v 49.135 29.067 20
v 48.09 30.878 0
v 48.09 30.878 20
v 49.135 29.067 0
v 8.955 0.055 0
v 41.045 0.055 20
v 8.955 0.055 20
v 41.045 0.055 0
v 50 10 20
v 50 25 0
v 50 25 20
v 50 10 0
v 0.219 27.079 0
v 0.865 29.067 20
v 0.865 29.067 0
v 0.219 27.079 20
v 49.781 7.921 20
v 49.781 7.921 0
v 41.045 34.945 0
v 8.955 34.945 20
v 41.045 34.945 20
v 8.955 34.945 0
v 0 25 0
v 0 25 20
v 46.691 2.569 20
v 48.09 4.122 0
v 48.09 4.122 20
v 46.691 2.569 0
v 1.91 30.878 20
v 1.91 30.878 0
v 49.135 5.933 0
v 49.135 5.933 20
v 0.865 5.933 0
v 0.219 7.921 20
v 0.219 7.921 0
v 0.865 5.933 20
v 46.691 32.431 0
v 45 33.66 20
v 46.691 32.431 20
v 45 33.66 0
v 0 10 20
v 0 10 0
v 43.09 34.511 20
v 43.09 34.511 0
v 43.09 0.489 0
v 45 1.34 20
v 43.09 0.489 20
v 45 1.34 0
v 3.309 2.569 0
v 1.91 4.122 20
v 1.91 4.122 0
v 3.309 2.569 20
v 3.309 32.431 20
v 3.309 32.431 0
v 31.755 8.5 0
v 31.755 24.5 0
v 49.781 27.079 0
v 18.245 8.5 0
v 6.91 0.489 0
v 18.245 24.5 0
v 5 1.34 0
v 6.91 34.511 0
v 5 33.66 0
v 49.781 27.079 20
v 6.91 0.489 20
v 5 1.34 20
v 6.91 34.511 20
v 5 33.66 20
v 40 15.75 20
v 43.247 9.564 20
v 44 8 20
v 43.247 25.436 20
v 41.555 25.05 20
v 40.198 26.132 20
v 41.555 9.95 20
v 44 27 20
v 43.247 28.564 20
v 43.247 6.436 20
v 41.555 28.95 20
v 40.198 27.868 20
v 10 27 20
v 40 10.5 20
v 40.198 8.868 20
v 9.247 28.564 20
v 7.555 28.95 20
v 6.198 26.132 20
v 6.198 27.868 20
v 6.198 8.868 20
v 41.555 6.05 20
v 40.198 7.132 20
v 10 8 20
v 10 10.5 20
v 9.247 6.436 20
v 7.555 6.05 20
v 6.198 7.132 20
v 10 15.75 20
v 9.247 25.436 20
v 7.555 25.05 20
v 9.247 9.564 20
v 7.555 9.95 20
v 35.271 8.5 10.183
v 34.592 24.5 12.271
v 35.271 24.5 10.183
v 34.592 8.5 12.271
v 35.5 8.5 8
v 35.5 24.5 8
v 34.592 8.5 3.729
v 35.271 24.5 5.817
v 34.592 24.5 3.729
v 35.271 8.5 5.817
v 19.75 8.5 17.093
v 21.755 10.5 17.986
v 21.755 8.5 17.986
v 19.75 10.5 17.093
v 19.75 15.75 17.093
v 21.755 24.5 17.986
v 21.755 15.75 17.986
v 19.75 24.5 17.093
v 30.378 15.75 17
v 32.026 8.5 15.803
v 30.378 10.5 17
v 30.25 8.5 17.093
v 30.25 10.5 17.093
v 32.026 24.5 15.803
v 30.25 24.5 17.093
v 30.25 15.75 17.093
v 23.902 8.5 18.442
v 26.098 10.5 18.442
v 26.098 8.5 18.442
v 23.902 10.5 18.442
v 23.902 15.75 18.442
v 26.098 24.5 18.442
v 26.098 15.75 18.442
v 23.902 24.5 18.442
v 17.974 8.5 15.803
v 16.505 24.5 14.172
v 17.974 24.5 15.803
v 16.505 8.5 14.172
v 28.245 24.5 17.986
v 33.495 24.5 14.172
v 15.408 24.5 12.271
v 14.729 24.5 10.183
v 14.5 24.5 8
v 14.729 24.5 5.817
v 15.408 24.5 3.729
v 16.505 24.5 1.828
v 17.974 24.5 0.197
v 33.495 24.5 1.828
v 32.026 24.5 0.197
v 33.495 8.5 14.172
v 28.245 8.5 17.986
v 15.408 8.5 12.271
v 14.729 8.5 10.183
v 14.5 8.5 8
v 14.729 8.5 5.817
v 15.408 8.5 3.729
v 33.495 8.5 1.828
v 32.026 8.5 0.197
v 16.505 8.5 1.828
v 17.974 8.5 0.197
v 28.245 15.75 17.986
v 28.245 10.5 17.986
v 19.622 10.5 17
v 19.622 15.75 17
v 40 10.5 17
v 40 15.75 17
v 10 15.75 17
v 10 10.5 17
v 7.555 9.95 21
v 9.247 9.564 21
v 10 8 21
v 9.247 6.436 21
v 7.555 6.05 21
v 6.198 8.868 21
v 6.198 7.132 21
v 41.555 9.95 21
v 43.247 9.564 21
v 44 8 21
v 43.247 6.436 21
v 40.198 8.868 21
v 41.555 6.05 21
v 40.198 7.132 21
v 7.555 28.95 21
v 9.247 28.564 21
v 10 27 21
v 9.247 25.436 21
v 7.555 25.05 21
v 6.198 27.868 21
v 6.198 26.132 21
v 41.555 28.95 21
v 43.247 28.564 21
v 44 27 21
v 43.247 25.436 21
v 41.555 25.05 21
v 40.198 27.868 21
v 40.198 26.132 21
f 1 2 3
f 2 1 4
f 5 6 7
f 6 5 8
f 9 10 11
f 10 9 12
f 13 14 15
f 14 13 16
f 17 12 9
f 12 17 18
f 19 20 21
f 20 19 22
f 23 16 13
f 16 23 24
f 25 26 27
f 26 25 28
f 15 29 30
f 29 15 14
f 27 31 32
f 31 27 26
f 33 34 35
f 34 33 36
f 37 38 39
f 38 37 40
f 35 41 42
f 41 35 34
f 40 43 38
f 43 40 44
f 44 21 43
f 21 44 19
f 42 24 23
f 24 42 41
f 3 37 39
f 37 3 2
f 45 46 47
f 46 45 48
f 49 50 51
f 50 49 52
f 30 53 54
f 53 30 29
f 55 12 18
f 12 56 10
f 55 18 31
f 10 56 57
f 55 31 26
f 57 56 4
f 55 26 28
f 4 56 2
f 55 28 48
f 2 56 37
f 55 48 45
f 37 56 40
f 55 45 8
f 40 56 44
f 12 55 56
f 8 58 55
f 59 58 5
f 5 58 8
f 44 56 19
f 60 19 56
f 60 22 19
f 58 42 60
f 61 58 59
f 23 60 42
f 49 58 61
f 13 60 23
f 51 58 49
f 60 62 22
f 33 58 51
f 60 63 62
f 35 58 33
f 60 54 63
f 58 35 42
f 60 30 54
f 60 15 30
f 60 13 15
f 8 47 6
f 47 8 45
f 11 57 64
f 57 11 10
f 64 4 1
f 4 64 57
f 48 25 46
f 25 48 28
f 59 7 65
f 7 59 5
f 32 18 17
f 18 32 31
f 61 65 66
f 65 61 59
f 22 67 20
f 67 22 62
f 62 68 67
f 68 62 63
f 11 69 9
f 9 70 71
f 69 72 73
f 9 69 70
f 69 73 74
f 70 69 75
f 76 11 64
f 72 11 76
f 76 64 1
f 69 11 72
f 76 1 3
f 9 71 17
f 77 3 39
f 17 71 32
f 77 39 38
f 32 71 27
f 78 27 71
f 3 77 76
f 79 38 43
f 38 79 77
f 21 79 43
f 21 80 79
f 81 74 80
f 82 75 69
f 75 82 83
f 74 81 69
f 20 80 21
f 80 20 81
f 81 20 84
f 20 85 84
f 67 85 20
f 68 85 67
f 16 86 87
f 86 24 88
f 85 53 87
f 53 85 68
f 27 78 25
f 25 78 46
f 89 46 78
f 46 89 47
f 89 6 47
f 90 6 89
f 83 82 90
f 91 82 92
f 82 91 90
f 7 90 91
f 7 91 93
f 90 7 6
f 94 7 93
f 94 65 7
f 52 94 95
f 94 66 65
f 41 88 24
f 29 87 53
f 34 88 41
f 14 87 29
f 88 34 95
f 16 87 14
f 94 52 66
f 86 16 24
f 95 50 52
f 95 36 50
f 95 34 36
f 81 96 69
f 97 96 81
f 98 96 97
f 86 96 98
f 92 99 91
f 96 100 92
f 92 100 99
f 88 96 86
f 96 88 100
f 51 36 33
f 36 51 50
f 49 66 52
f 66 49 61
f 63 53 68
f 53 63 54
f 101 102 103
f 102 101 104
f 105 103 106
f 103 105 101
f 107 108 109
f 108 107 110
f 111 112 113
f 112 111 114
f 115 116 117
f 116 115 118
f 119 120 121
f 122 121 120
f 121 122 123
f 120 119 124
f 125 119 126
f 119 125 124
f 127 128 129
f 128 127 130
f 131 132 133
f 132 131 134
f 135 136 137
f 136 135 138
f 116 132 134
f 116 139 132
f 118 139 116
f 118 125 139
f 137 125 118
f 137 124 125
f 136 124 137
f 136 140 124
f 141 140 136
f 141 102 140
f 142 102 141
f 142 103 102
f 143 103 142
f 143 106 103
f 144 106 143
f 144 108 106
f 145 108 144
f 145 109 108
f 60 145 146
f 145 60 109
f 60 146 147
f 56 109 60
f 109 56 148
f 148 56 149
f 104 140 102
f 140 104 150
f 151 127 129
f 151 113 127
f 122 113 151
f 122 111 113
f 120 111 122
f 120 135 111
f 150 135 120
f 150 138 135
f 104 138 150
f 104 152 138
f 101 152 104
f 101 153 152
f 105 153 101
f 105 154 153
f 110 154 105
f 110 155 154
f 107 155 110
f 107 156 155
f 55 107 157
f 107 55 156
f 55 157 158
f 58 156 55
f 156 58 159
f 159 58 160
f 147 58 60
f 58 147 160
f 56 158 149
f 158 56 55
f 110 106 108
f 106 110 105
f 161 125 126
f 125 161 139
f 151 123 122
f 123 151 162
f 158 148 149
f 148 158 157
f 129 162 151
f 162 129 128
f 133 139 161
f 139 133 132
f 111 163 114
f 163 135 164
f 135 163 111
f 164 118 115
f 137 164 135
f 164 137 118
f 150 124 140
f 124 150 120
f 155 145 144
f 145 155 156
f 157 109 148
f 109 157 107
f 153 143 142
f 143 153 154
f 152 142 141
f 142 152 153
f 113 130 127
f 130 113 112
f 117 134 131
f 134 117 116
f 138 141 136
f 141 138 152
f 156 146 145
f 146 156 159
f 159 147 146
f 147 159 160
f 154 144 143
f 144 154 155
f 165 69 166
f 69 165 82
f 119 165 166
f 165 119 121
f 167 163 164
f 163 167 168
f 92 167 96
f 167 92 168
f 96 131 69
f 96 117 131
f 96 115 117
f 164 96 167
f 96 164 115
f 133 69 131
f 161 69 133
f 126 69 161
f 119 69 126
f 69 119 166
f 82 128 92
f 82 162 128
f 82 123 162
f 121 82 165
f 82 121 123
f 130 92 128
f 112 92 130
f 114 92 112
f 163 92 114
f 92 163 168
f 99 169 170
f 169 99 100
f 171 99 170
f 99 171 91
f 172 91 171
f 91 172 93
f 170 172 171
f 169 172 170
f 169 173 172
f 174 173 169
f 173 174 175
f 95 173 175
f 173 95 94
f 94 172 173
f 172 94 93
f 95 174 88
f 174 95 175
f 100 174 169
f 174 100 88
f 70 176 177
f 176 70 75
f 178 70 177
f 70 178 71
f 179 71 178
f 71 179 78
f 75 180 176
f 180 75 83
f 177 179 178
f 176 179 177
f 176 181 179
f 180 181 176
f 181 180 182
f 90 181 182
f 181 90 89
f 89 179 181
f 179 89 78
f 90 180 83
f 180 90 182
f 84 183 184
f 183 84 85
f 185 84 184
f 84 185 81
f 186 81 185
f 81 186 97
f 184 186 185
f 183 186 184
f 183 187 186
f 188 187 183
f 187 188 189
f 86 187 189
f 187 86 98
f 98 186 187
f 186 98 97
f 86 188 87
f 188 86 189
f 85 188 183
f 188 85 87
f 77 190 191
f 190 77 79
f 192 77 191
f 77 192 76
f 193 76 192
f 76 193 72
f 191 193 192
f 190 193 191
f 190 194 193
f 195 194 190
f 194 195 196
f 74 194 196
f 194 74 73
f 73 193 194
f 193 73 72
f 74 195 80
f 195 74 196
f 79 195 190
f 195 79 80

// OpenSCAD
// PERCY UNIT - Shoulder Pads (x2)
// OpenSCAD file - export to STL for 3D printing

// Parameters
pad_width = 50;
pad_depth = 35;
pad_height = 20;
curve_radius = 10;

// Rounded shoulder pad shape
module shoulder_pad(w, d, h, r) {
    hull() {
        translate([r, r, 0])
            cylinder(r=r, h=h);
        translate([w - r, r, 0])
            cylinder(r=r, h=h);
        translate([r, d - r, 0])
            cylinder(r=r, h=h);
        translate([w - r, d - r, 0])
            cylinder(r=r, h=h);
    }
}

difference() {
    shoulder_pad(pad_width, pad_depth, pad_height, curve_radius);
    
    // Curved arm hole (for shoulder joint)
    translate([pad_width/2, pad_depth*0.7, pad_height*0.4])
        rotate([90, 0, 0])
            cylinder(d=pad_depth*0.6, h=pad_height*0.8);
    
    // LED channel groove
    translate([pad_width*0.2, pad_depth*0.3, pad_height - 3])
        cube([pad_width*0.6, pad_depth*0.15, 3]);
}

// Mounting holes (4 corners)
mount_hole_dia = 4;
translate([8, 8, pad_height - 2]) cylinder(d=mount_hole_dia, h=3);
translate([pad_width - 8, 8, pad_height - 2]) cylinder(d=mount_hole_dia, h=3);
translate([8, pad_depth - 8, pad_height - 2]) cylinder(d=mount_hole_dia, h=3);
translate([pad_width - 8, pad_depth - 8, pad_height - 2]) cylinder(d=mount_hole_dia, h=3);
